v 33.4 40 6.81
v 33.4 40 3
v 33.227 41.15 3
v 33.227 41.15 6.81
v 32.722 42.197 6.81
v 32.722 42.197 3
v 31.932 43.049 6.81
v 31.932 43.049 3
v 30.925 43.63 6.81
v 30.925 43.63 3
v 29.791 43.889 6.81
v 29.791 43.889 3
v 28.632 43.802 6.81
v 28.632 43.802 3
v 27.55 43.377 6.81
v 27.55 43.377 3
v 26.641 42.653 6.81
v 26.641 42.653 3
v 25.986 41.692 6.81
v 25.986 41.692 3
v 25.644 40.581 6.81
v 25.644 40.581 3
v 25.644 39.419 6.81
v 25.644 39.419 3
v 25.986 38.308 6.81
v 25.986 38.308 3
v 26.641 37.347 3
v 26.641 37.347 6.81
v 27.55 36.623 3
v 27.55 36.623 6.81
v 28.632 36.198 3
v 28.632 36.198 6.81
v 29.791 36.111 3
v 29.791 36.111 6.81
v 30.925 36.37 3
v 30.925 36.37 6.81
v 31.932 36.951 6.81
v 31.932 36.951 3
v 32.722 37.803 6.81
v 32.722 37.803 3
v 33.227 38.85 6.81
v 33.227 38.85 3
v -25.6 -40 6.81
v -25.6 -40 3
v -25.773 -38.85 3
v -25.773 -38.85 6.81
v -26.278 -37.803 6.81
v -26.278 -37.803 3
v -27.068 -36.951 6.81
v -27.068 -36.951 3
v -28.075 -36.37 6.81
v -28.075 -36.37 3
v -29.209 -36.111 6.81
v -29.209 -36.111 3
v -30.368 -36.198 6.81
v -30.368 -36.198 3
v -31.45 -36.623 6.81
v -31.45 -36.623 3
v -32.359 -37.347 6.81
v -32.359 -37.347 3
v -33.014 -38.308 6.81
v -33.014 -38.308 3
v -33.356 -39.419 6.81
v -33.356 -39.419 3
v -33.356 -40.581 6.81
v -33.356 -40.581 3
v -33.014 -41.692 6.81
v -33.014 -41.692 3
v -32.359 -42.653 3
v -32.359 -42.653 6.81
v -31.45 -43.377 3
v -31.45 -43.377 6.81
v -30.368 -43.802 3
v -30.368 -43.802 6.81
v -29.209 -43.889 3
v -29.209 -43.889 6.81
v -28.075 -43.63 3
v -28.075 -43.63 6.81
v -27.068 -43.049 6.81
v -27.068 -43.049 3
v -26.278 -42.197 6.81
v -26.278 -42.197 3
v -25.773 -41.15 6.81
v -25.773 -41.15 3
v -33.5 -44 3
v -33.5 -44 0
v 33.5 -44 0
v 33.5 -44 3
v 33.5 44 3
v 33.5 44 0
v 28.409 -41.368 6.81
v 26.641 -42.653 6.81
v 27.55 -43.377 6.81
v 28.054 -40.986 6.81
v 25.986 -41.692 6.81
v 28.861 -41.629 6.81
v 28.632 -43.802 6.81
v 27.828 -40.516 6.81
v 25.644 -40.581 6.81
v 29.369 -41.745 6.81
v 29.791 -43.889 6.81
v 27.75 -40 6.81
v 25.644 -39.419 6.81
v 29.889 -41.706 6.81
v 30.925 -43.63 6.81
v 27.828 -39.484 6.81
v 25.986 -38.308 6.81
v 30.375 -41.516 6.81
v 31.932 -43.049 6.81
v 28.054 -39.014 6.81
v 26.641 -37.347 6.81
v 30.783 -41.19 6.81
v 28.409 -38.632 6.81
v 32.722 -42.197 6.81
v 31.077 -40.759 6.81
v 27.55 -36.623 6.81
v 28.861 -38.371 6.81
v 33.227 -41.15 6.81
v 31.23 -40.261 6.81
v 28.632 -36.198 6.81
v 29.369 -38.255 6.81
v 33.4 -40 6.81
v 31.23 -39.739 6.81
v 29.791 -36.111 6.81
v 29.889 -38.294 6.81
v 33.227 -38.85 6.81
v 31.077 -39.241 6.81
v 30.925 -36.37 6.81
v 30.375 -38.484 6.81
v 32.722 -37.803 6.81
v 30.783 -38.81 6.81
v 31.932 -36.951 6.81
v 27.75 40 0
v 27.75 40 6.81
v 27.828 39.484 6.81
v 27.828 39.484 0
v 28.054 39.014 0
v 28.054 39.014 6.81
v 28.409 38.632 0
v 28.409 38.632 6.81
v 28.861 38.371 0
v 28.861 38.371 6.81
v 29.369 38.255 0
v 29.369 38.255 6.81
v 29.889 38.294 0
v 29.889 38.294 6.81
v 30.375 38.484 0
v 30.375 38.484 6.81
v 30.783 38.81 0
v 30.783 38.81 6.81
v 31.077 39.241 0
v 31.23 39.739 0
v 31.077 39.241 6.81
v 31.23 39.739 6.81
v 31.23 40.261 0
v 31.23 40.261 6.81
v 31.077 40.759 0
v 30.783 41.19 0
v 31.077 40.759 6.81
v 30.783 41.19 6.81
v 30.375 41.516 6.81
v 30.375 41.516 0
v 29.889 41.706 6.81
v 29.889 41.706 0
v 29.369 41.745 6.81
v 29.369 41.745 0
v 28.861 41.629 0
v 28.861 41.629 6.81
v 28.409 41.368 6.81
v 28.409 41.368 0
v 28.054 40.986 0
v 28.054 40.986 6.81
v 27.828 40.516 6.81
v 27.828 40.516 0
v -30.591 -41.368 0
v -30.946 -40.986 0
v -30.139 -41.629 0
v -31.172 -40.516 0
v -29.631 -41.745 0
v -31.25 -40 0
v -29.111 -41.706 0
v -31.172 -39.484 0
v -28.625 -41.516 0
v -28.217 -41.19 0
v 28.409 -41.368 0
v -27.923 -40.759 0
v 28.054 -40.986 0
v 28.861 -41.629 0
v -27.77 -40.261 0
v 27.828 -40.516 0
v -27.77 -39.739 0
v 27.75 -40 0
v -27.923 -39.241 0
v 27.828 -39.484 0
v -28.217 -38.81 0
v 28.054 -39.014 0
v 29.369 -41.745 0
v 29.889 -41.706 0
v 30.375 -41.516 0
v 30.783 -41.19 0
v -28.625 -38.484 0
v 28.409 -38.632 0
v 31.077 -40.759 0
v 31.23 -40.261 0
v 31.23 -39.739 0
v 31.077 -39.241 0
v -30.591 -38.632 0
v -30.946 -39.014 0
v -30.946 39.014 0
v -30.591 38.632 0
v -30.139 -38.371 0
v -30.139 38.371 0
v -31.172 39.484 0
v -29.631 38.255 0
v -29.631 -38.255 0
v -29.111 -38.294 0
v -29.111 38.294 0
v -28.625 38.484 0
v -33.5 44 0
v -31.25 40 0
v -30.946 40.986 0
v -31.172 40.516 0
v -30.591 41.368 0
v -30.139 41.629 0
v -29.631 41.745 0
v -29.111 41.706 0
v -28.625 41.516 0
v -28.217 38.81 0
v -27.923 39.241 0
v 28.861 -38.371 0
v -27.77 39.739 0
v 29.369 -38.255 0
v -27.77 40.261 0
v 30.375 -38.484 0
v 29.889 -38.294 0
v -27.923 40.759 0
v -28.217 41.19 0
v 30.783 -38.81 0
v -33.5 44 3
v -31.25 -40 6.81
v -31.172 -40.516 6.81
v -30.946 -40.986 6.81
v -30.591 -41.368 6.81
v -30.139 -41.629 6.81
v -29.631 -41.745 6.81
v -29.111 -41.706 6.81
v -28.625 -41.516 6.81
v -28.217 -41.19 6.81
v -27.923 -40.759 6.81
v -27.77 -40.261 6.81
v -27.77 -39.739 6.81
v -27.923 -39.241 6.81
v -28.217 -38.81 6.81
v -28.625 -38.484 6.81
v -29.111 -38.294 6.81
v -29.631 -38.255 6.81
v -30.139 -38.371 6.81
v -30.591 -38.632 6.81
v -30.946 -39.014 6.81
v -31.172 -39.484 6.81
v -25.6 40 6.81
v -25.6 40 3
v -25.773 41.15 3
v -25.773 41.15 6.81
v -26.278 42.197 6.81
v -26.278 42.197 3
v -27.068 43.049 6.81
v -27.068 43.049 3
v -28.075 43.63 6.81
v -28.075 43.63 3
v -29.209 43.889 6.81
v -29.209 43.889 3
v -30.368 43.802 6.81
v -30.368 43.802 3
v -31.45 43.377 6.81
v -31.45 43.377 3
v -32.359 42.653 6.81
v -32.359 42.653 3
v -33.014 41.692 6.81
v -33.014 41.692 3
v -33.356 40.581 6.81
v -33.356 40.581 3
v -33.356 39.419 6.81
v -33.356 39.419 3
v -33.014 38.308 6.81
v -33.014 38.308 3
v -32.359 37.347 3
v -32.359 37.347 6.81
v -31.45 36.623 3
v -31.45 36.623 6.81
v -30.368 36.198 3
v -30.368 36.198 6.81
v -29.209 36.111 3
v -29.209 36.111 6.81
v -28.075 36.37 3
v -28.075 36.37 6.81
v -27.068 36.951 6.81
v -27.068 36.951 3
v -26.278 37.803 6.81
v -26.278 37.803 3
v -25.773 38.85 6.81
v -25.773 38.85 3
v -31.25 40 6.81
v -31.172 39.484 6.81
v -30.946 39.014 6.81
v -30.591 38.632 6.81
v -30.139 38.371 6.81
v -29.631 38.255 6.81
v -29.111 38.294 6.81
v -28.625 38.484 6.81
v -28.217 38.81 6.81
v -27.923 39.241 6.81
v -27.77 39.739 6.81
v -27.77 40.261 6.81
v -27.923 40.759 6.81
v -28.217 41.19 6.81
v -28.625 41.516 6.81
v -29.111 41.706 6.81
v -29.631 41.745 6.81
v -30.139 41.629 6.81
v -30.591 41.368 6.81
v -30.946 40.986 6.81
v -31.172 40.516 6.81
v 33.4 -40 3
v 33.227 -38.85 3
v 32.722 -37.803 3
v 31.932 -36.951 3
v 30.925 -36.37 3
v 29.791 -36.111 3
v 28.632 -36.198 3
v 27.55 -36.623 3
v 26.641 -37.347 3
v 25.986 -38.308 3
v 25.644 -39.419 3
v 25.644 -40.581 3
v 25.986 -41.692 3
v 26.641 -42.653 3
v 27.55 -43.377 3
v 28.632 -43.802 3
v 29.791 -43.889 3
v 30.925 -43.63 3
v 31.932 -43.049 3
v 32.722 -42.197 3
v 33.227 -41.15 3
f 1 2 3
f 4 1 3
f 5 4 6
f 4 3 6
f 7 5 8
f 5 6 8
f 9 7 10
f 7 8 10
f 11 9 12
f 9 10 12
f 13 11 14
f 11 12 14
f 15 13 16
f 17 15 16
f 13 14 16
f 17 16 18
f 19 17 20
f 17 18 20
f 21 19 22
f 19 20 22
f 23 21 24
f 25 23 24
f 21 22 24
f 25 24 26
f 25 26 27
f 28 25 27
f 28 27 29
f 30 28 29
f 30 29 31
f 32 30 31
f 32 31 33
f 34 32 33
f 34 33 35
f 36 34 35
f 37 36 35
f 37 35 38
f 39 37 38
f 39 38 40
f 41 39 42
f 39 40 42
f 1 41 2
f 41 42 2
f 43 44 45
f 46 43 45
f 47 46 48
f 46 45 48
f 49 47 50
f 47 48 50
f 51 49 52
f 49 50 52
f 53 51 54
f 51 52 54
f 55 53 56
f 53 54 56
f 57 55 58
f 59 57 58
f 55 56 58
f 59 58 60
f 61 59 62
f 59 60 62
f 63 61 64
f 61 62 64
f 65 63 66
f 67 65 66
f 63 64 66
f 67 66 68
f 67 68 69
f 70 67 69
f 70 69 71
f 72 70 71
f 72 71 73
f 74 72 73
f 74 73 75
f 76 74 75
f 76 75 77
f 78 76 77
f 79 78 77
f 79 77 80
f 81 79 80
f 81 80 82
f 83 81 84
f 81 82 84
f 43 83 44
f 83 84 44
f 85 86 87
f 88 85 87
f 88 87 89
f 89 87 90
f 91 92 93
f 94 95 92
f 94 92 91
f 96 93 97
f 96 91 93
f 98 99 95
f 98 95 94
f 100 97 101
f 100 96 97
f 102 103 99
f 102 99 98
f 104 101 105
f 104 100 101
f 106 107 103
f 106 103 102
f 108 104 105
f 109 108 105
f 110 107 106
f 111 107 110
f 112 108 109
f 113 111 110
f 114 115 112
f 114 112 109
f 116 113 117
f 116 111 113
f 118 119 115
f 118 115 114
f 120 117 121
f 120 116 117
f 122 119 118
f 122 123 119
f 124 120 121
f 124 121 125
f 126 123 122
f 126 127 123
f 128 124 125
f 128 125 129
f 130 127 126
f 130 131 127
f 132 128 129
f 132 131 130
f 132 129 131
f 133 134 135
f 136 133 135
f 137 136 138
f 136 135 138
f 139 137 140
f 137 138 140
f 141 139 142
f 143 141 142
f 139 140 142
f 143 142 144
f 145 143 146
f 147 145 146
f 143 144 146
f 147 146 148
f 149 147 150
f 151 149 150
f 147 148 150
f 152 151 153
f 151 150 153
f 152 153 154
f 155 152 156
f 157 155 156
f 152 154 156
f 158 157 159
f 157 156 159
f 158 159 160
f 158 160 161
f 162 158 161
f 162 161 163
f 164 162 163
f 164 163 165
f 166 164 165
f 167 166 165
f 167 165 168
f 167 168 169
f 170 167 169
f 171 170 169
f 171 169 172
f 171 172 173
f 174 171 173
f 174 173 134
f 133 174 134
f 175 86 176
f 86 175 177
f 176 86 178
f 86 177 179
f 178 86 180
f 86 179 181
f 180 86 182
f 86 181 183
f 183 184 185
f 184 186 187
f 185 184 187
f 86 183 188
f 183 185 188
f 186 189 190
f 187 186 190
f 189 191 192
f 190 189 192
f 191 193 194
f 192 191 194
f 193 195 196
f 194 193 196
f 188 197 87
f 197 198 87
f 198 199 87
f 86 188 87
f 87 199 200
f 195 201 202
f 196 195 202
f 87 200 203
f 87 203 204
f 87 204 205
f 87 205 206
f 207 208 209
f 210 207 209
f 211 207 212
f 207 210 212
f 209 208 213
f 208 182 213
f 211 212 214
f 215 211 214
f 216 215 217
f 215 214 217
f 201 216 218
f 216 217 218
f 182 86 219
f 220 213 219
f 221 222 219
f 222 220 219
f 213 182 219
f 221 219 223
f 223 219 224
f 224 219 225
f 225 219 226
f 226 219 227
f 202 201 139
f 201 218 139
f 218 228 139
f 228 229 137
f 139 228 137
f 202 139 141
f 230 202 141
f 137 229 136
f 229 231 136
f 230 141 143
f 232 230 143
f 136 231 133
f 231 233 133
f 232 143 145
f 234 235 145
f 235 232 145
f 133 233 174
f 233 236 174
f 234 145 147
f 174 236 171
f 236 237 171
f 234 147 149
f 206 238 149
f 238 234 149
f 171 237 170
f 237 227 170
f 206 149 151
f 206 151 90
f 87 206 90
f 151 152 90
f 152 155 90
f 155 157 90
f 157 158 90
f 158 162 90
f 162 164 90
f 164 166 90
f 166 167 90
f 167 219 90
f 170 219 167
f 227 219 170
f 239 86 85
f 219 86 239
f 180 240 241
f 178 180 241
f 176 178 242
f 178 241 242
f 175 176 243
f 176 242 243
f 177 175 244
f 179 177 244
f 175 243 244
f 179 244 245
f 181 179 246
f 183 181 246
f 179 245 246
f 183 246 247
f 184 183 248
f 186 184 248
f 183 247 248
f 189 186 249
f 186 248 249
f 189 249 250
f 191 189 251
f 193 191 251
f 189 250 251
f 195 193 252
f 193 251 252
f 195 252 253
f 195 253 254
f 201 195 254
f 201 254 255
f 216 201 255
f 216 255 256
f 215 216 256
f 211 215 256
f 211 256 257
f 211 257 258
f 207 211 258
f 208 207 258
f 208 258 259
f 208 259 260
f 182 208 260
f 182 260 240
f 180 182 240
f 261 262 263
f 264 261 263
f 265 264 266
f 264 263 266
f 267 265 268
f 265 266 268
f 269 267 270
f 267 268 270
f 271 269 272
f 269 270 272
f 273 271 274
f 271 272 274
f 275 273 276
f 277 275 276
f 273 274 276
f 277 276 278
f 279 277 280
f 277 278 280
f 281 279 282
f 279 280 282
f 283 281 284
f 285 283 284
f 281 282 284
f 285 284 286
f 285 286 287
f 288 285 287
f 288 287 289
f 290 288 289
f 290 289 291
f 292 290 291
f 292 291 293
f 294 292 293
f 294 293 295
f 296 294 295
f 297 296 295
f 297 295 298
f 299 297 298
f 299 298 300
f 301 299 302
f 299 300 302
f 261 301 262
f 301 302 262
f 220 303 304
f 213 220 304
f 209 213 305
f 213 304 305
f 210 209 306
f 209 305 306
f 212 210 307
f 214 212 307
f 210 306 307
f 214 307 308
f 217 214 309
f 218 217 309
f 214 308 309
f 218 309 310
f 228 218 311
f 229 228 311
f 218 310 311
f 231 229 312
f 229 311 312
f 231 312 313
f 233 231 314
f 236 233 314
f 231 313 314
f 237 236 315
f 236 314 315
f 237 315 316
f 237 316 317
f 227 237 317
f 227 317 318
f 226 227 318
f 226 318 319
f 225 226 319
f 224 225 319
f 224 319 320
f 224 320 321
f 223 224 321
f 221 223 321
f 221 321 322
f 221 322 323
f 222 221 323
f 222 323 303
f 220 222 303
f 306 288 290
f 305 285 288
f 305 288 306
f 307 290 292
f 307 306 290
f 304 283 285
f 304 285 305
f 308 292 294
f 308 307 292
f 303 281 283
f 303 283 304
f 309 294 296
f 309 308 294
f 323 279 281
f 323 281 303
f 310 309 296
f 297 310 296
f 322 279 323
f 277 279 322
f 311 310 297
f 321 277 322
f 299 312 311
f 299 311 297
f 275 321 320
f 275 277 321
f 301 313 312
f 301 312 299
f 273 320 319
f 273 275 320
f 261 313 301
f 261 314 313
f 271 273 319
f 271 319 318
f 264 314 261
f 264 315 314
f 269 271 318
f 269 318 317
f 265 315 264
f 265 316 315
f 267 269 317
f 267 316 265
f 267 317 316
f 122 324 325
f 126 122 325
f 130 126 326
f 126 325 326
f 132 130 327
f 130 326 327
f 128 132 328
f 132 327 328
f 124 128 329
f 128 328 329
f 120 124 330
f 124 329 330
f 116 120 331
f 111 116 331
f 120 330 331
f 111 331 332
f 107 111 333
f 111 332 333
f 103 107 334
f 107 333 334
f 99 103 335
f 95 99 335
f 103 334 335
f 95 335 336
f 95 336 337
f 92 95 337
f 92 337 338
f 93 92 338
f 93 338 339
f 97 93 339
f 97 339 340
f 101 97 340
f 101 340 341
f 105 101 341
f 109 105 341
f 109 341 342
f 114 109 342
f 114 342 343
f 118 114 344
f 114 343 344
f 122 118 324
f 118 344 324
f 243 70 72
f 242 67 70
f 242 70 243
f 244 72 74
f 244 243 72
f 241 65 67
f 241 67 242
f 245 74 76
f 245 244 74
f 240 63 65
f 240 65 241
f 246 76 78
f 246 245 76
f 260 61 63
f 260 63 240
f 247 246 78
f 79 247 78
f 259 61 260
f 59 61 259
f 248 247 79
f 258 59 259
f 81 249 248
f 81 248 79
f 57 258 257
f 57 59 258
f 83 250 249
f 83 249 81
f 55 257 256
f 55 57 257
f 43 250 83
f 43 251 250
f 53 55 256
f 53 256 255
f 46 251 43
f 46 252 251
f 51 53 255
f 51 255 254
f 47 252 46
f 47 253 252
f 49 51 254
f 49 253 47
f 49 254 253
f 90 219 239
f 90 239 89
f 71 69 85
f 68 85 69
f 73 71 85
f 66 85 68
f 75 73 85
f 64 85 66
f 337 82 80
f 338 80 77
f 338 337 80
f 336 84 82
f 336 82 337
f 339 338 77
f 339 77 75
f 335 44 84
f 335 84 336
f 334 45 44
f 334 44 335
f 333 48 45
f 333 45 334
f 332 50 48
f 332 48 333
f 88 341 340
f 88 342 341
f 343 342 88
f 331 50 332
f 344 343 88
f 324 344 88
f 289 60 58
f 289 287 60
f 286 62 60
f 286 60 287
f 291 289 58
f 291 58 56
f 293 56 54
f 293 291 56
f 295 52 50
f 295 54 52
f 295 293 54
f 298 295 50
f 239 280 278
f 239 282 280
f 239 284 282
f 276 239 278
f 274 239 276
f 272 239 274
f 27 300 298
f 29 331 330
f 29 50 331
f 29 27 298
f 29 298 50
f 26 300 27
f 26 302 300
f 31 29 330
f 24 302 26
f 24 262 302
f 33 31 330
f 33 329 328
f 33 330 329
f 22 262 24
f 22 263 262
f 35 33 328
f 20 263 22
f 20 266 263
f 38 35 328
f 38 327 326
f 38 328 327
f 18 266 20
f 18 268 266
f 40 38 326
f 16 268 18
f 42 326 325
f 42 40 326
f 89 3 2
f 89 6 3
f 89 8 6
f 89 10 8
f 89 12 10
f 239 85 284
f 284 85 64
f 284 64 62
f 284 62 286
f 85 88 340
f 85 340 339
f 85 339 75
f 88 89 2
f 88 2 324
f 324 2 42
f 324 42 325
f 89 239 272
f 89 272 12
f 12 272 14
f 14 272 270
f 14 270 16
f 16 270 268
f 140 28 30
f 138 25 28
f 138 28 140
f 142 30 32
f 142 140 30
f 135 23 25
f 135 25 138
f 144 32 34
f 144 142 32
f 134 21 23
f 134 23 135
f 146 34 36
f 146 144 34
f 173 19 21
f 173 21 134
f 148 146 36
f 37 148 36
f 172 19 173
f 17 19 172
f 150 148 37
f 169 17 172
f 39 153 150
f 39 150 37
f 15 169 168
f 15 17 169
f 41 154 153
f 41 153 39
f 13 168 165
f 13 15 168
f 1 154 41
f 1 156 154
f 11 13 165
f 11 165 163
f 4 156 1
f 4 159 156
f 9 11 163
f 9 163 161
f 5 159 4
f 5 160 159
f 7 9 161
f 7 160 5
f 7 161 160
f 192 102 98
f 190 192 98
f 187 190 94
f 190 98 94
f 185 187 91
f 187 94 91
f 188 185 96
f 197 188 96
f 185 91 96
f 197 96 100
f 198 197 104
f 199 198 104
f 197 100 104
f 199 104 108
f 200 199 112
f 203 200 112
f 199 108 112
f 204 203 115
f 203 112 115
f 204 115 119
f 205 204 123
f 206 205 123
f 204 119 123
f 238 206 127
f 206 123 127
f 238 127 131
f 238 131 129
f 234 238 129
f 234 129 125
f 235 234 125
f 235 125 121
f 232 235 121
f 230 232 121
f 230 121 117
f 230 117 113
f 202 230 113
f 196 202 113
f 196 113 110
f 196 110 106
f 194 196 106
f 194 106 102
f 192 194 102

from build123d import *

# Parameters (mm, degrees)
F0_W     = 67
F0_H     = 88
F1_DEPTH = 3
F2_R     = 3.9
F3_DEPTH = 3.81
F5_D     = 3.5


with BuildPart() as f1:
    # F0 (on Top) → F1 (new body)
    with BuildSketch(Plane.XY):
        Rectangle(F0_W, F0_H)
    extrude(amount=F1_DEPTH)

    # F2 (on face) → F3 (join)
    with BuildSketch(Plane.XY.offset(3)):
        with Locations((-29.5, 40)):
            Circle(F2_R)
        with Locations((29.5, 40)):
            Circle(F2_R)
        with Locations((-29.5, -40)):
            Circle(F2_R)
        with Locations((29.5, -40)):
            Circle(F2_R)
    extrude(amount=F3_DEPTH)

    # F5 (through all)
    with Locations(Plane(origin=(0, 0, 0), x_dir=(1, 0, 0), z_dir=(0, 0, -1))):
        with Locations((29.5, 40), (-29.5, 40), (-29.5, -40), (29.5, -40)):
            Hole(F5_D / 2)


solid = f1.part
